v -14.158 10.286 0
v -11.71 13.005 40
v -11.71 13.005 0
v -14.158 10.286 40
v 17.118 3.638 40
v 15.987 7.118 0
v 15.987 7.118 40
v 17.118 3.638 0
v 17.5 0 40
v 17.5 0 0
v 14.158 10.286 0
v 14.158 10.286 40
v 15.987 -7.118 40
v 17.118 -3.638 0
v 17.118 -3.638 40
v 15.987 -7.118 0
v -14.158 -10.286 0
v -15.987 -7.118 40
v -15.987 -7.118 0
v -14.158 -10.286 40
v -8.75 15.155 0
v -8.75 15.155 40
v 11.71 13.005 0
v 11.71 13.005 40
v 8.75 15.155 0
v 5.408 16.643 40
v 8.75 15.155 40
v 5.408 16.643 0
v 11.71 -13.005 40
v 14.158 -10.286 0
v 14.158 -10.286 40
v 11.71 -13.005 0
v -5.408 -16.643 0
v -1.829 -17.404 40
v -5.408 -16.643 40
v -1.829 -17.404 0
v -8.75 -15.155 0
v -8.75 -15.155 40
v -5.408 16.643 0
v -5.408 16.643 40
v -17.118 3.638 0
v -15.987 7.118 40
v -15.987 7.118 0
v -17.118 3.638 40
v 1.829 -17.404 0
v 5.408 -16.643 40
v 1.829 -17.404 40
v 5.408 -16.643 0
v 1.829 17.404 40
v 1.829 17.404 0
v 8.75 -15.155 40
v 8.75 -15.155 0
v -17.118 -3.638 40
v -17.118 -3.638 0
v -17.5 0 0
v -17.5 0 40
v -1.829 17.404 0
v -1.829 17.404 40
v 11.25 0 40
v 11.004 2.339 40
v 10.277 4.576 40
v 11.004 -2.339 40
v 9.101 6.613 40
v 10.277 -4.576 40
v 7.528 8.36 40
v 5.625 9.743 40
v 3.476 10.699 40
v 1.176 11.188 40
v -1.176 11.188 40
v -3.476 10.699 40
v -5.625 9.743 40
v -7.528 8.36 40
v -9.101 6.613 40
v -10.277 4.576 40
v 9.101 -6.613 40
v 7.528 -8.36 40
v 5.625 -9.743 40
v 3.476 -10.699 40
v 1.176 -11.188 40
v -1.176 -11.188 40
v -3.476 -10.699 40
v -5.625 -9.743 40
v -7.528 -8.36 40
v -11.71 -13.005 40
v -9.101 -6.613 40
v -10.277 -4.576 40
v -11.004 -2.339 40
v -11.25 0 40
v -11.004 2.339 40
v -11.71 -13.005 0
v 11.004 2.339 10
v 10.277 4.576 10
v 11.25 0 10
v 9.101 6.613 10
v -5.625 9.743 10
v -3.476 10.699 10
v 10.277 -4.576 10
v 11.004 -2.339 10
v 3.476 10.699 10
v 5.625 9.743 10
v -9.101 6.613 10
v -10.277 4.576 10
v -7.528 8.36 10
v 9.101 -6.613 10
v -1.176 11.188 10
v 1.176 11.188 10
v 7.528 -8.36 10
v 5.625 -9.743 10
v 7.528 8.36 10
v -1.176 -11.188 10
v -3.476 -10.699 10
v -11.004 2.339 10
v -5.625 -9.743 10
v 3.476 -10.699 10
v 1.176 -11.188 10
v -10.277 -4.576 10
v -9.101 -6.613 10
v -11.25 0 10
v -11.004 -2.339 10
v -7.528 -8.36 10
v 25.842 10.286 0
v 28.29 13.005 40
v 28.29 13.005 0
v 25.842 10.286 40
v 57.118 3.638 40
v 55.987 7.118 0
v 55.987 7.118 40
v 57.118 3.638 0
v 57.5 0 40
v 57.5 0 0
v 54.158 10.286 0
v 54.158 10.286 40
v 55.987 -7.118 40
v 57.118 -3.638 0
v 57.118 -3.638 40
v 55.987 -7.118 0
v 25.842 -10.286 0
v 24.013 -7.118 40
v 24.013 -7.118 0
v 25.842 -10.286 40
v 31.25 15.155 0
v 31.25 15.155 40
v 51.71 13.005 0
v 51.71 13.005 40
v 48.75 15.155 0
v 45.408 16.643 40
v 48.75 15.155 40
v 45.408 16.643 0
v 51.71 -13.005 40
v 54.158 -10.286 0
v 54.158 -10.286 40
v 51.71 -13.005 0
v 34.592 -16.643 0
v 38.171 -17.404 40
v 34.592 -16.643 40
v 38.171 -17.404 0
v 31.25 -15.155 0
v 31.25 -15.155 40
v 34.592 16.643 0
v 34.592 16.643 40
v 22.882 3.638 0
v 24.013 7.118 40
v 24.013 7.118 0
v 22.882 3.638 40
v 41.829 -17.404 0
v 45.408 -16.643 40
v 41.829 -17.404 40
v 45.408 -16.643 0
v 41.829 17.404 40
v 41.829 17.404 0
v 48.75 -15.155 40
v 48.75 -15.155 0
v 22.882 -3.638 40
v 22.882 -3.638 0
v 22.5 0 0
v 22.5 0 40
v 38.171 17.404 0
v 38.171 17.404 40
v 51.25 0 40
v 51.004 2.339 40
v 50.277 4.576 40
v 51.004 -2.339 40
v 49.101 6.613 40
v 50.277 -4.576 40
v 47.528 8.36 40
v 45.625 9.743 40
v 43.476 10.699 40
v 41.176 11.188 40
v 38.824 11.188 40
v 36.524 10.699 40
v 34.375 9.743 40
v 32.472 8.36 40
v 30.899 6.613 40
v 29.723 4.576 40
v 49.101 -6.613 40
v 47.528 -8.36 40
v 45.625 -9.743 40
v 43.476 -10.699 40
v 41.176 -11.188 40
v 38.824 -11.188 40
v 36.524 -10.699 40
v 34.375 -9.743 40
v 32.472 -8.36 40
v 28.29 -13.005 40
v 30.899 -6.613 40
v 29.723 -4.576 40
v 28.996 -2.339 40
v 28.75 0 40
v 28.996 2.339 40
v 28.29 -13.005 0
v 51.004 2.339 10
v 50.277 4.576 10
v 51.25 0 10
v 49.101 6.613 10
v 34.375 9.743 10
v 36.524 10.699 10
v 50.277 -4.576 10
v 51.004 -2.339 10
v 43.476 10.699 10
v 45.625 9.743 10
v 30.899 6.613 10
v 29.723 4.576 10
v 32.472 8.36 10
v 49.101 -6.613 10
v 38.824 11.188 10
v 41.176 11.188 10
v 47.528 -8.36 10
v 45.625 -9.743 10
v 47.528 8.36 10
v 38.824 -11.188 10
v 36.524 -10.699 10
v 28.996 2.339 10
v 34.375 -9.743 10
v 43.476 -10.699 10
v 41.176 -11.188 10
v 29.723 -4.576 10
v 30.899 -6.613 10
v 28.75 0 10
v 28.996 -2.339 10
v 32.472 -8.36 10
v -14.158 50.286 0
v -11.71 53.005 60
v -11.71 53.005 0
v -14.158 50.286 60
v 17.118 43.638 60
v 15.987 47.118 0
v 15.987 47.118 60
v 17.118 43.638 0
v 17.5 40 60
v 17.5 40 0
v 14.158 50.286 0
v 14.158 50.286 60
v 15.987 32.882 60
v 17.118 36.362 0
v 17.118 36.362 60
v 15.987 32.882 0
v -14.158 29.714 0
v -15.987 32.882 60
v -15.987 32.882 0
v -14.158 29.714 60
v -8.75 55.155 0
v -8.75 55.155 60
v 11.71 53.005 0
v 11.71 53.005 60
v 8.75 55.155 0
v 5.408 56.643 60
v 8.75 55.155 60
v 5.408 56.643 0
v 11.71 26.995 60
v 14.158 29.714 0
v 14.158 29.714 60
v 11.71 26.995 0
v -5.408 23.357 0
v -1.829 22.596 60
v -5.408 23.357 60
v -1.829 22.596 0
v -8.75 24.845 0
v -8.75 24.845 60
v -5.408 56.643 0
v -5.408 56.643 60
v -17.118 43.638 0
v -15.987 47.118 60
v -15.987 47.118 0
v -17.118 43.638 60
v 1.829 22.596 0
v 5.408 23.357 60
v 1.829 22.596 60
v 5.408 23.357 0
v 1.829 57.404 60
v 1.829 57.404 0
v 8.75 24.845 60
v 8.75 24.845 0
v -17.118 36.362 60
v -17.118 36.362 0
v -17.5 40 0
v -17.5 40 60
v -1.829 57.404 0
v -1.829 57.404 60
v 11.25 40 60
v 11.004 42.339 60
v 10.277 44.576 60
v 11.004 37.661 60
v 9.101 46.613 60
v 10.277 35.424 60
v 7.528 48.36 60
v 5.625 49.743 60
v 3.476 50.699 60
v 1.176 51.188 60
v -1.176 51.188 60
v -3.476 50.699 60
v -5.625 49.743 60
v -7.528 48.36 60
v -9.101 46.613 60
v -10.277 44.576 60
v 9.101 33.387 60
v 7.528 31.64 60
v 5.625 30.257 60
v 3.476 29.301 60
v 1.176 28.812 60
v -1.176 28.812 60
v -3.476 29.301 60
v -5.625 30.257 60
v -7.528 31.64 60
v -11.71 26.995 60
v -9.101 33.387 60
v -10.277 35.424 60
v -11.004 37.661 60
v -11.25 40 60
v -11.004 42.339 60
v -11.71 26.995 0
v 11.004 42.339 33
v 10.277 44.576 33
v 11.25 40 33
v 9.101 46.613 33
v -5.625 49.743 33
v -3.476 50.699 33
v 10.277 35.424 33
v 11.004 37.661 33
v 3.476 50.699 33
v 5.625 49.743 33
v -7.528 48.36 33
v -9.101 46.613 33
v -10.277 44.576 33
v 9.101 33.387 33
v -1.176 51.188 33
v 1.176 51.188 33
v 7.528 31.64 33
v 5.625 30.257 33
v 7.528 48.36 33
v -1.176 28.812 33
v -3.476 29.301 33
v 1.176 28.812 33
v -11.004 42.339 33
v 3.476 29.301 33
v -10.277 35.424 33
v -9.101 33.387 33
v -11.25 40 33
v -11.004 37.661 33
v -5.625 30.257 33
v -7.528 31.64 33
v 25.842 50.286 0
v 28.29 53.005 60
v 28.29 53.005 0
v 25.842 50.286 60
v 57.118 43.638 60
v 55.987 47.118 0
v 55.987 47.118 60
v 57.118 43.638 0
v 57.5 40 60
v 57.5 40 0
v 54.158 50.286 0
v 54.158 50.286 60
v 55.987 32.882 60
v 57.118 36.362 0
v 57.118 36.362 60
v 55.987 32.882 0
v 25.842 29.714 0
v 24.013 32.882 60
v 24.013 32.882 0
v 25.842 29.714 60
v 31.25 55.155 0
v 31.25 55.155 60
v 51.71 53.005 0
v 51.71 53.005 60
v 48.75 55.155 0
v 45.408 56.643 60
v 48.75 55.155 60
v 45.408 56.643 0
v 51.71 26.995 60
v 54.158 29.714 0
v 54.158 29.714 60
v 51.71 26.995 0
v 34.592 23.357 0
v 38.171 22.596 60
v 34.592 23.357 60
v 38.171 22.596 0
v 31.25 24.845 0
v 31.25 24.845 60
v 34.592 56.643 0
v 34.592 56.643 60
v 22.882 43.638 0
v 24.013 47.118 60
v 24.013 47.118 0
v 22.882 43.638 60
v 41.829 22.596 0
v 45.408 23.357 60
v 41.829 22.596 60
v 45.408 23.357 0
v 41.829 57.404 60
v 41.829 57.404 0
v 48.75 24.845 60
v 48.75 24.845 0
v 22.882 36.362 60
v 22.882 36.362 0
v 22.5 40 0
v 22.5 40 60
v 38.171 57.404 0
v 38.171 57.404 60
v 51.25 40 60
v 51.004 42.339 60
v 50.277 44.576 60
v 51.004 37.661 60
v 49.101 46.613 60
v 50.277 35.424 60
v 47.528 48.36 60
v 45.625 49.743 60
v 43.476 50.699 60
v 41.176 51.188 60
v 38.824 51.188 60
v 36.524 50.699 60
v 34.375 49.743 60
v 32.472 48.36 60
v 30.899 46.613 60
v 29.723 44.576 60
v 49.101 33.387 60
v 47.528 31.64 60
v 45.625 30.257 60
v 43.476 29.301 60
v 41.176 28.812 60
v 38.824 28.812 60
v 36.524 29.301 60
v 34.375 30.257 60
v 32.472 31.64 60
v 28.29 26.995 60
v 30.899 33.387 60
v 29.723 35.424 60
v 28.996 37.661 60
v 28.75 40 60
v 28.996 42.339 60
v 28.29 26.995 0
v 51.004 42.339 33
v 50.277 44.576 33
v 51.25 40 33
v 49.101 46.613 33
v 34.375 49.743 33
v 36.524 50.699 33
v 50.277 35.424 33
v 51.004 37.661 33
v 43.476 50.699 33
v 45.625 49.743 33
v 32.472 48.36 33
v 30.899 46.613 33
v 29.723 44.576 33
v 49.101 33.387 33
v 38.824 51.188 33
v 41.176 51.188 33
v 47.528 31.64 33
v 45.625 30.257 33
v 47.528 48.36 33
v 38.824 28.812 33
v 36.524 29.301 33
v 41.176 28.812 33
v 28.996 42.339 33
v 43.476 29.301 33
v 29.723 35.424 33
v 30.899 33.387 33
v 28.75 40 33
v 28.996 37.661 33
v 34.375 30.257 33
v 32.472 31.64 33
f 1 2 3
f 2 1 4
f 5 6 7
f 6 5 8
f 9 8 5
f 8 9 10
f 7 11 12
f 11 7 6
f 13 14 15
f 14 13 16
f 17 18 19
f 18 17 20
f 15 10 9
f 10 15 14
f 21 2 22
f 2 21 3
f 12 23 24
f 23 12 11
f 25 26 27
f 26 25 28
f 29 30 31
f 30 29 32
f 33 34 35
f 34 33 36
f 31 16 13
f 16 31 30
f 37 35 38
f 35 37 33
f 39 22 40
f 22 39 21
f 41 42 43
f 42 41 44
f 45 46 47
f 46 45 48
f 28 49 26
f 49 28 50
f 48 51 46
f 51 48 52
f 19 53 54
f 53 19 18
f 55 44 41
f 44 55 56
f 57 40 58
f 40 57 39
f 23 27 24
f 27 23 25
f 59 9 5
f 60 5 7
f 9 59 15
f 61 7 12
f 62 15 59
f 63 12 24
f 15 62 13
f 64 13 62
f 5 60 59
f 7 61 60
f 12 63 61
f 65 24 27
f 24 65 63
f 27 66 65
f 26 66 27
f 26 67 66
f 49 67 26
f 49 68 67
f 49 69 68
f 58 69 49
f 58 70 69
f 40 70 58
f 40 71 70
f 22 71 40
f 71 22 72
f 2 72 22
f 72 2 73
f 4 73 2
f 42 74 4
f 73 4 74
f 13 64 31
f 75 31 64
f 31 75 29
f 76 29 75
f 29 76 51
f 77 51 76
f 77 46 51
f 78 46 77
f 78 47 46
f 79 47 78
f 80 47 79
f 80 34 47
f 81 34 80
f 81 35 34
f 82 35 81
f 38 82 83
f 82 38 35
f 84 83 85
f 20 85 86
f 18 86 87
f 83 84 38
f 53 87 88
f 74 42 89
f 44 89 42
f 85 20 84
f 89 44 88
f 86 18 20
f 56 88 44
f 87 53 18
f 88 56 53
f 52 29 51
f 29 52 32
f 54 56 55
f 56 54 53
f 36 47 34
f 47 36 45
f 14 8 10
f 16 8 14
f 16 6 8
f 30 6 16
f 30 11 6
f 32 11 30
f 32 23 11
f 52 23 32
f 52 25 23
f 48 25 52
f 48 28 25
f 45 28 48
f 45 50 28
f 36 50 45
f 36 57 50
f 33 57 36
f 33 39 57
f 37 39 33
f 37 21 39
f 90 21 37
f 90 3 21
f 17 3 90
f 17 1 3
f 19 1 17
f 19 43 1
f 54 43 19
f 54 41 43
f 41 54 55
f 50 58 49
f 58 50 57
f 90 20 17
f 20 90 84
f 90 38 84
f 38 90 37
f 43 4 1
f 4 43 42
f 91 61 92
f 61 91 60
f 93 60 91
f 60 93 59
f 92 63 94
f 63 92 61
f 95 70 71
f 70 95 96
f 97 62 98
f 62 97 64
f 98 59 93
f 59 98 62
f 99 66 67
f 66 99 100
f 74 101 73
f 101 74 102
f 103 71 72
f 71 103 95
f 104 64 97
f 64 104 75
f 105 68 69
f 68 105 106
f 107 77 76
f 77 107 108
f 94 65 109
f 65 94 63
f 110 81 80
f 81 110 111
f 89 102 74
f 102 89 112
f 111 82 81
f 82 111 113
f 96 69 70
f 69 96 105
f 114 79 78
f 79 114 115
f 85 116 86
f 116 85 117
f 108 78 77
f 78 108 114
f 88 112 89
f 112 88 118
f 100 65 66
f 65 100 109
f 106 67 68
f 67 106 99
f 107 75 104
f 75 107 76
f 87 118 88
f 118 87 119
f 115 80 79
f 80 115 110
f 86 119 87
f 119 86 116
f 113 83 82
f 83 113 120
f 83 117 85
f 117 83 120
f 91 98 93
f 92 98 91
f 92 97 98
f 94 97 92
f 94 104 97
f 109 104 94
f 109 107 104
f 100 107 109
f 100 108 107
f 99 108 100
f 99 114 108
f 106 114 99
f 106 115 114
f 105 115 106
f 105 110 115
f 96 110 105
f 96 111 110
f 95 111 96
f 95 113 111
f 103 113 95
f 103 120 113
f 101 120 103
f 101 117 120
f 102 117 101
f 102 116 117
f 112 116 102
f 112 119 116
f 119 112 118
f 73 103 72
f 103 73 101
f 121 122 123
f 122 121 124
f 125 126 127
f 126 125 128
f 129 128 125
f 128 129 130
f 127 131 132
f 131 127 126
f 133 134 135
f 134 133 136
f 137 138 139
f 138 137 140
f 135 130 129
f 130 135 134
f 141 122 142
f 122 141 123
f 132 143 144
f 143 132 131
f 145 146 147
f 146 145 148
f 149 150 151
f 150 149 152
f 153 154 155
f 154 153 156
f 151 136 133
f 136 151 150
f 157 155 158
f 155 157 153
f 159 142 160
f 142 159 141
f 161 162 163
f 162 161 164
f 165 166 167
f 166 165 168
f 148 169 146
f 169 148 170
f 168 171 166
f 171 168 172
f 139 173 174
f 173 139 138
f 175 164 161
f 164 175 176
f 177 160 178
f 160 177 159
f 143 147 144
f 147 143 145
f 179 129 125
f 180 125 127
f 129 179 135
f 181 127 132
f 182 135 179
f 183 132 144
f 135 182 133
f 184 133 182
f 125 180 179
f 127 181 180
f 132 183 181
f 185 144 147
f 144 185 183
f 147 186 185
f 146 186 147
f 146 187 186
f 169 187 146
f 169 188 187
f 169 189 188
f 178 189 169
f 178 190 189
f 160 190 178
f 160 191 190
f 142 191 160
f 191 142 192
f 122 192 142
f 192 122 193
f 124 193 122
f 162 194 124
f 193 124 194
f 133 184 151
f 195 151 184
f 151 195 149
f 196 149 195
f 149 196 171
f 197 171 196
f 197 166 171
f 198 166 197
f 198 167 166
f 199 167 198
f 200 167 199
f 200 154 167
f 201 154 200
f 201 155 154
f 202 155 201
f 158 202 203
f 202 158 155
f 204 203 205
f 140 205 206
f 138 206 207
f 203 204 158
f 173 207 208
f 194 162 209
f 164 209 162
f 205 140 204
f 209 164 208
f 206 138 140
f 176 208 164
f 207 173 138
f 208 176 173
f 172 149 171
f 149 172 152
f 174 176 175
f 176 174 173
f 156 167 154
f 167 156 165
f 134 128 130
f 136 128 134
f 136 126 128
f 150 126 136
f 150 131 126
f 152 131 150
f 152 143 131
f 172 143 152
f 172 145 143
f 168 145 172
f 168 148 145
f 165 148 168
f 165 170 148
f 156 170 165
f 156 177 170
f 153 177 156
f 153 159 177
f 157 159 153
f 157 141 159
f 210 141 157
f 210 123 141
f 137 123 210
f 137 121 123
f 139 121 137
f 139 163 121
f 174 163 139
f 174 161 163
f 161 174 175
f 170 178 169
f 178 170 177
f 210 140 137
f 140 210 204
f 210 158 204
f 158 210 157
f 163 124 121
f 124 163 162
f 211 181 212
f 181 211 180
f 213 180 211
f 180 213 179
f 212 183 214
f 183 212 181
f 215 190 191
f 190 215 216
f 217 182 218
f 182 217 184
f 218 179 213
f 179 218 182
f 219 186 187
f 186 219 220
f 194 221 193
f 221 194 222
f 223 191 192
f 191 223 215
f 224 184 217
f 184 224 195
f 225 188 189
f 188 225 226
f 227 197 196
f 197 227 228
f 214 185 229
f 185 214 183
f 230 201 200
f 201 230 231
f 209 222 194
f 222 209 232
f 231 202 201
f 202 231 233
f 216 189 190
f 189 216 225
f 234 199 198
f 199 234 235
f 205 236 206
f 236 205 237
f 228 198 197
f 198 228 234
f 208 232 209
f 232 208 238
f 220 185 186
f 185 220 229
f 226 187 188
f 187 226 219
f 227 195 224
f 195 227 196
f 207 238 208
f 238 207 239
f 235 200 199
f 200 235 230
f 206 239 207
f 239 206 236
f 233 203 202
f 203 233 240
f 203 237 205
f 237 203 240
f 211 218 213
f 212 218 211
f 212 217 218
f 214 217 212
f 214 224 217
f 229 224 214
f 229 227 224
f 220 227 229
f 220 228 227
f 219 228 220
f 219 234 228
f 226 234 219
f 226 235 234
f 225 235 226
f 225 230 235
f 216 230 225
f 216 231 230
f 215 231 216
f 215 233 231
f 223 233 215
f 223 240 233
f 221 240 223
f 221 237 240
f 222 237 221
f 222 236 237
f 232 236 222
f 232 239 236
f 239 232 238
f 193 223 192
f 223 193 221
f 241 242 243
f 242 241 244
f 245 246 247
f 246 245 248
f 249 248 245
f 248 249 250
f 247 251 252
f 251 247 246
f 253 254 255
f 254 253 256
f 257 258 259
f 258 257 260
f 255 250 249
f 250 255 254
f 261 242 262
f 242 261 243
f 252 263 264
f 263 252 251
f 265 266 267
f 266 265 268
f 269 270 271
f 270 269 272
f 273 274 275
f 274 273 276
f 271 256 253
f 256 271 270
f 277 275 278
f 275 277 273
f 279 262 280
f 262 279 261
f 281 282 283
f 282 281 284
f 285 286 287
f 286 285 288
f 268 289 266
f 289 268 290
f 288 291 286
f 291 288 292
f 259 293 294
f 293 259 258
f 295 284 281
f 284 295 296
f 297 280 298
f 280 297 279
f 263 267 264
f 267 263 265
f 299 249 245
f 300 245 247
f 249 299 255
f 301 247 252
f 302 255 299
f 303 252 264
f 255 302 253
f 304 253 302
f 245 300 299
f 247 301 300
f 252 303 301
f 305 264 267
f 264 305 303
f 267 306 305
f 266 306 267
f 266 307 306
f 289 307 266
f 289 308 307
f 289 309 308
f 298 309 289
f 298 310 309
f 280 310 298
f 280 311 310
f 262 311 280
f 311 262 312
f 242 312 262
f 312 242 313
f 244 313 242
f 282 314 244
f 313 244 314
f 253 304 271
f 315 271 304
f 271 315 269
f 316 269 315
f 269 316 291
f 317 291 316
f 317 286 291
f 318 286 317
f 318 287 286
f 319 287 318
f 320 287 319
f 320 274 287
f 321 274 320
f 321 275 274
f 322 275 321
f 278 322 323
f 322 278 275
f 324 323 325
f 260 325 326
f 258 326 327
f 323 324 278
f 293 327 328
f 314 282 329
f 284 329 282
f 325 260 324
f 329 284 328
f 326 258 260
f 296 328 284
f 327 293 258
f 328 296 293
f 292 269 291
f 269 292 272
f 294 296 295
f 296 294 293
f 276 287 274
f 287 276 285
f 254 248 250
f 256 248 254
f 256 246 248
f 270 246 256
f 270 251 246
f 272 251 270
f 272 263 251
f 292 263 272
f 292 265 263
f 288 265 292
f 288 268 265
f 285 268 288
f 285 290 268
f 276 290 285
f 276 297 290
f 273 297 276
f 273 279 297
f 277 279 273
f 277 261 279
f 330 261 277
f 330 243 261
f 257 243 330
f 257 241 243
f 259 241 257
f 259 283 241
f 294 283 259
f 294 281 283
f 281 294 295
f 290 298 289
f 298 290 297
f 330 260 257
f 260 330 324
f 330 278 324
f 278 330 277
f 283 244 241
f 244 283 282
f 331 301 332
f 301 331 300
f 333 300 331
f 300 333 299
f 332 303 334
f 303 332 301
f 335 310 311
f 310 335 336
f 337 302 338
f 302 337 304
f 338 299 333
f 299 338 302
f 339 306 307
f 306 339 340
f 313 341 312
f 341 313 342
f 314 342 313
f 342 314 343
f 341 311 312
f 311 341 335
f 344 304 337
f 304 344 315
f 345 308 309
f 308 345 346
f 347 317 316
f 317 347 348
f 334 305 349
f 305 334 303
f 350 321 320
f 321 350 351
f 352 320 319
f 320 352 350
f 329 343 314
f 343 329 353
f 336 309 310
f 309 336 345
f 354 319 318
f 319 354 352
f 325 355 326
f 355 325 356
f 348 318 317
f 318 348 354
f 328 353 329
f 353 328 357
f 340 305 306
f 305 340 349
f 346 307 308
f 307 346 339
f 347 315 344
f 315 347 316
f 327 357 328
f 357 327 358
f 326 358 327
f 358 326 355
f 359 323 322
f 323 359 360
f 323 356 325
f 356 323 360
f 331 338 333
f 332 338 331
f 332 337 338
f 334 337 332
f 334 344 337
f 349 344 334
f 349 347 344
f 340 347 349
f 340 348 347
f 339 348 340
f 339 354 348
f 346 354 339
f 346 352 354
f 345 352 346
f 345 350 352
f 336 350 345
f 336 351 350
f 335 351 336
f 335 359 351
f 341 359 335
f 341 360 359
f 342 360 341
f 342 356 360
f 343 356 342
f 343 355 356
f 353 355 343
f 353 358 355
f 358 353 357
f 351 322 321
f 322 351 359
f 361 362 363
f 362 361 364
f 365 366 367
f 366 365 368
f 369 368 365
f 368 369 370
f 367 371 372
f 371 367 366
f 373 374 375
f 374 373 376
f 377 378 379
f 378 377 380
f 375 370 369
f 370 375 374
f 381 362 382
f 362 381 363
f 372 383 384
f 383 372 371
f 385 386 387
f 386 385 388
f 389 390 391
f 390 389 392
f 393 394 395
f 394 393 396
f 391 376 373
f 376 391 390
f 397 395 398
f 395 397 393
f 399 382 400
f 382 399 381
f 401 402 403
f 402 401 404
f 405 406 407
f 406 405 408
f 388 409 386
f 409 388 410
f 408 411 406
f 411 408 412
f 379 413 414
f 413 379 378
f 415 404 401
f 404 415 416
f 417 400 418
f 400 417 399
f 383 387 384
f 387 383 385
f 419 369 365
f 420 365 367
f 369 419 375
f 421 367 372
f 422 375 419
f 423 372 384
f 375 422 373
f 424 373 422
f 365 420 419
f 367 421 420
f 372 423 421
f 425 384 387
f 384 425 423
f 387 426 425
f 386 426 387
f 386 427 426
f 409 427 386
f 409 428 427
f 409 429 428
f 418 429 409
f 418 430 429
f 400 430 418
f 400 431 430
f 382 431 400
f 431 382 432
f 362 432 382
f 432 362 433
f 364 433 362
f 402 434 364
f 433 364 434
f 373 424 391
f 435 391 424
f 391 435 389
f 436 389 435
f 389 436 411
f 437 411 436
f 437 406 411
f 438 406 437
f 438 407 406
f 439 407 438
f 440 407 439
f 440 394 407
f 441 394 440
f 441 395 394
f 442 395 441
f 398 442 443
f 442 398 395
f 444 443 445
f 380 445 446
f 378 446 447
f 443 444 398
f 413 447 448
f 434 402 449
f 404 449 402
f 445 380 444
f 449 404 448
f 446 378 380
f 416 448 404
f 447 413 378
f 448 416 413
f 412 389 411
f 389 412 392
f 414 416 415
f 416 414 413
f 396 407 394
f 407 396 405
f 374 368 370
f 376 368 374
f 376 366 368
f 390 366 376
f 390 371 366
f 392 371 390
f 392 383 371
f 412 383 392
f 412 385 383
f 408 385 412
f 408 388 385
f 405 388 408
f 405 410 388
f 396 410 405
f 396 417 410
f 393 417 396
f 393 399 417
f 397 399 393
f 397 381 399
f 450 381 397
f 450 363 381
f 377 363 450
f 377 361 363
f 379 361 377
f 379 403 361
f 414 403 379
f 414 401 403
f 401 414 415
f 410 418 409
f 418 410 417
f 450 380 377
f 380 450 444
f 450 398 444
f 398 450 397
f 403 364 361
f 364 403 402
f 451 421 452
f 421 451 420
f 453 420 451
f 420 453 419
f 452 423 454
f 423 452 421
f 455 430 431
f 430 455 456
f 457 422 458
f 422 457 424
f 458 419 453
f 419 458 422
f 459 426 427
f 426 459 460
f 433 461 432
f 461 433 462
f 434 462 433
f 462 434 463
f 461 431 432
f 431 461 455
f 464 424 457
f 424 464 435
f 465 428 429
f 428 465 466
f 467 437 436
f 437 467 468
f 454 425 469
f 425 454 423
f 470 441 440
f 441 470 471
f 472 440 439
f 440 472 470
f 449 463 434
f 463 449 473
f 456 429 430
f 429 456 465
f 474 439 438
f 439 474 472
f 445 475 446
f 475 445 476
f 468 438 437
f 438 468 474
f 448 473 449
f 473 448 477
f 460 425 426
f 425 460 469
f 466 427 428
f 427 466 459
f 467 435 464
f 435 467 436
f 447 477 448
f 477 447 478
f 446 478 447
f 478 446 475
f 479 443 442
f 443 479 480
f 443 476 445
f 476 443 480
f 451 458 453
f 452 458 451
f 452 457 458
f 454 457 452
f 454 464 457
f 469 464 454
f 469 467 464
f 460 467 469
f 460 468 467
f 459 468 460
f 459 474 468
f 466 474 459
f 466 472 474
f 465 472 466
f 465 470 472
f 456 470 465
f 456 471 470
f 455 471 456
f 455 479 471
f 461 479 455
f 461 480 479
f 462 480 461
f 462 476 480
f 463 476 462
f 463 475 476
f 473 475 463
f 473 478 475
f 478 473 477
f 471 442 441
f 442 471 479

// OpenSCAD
module leg(h, d) {
    
    difference() {
        cylinder(h, 35 / 2, 35 / 2);
        translate([0, 0, d])
        cylinder(h, 22.5 / 2, 22.5 / 2);
    }
}

translate([0, 0, 0])
leg(40, 10);

translate([40, 0, 0])
leg(40, 10);

translate([0, 40, 0])
leg(60, 10 + 23);

translate([40, 40, 0])
leg(60, 10 + 23);
